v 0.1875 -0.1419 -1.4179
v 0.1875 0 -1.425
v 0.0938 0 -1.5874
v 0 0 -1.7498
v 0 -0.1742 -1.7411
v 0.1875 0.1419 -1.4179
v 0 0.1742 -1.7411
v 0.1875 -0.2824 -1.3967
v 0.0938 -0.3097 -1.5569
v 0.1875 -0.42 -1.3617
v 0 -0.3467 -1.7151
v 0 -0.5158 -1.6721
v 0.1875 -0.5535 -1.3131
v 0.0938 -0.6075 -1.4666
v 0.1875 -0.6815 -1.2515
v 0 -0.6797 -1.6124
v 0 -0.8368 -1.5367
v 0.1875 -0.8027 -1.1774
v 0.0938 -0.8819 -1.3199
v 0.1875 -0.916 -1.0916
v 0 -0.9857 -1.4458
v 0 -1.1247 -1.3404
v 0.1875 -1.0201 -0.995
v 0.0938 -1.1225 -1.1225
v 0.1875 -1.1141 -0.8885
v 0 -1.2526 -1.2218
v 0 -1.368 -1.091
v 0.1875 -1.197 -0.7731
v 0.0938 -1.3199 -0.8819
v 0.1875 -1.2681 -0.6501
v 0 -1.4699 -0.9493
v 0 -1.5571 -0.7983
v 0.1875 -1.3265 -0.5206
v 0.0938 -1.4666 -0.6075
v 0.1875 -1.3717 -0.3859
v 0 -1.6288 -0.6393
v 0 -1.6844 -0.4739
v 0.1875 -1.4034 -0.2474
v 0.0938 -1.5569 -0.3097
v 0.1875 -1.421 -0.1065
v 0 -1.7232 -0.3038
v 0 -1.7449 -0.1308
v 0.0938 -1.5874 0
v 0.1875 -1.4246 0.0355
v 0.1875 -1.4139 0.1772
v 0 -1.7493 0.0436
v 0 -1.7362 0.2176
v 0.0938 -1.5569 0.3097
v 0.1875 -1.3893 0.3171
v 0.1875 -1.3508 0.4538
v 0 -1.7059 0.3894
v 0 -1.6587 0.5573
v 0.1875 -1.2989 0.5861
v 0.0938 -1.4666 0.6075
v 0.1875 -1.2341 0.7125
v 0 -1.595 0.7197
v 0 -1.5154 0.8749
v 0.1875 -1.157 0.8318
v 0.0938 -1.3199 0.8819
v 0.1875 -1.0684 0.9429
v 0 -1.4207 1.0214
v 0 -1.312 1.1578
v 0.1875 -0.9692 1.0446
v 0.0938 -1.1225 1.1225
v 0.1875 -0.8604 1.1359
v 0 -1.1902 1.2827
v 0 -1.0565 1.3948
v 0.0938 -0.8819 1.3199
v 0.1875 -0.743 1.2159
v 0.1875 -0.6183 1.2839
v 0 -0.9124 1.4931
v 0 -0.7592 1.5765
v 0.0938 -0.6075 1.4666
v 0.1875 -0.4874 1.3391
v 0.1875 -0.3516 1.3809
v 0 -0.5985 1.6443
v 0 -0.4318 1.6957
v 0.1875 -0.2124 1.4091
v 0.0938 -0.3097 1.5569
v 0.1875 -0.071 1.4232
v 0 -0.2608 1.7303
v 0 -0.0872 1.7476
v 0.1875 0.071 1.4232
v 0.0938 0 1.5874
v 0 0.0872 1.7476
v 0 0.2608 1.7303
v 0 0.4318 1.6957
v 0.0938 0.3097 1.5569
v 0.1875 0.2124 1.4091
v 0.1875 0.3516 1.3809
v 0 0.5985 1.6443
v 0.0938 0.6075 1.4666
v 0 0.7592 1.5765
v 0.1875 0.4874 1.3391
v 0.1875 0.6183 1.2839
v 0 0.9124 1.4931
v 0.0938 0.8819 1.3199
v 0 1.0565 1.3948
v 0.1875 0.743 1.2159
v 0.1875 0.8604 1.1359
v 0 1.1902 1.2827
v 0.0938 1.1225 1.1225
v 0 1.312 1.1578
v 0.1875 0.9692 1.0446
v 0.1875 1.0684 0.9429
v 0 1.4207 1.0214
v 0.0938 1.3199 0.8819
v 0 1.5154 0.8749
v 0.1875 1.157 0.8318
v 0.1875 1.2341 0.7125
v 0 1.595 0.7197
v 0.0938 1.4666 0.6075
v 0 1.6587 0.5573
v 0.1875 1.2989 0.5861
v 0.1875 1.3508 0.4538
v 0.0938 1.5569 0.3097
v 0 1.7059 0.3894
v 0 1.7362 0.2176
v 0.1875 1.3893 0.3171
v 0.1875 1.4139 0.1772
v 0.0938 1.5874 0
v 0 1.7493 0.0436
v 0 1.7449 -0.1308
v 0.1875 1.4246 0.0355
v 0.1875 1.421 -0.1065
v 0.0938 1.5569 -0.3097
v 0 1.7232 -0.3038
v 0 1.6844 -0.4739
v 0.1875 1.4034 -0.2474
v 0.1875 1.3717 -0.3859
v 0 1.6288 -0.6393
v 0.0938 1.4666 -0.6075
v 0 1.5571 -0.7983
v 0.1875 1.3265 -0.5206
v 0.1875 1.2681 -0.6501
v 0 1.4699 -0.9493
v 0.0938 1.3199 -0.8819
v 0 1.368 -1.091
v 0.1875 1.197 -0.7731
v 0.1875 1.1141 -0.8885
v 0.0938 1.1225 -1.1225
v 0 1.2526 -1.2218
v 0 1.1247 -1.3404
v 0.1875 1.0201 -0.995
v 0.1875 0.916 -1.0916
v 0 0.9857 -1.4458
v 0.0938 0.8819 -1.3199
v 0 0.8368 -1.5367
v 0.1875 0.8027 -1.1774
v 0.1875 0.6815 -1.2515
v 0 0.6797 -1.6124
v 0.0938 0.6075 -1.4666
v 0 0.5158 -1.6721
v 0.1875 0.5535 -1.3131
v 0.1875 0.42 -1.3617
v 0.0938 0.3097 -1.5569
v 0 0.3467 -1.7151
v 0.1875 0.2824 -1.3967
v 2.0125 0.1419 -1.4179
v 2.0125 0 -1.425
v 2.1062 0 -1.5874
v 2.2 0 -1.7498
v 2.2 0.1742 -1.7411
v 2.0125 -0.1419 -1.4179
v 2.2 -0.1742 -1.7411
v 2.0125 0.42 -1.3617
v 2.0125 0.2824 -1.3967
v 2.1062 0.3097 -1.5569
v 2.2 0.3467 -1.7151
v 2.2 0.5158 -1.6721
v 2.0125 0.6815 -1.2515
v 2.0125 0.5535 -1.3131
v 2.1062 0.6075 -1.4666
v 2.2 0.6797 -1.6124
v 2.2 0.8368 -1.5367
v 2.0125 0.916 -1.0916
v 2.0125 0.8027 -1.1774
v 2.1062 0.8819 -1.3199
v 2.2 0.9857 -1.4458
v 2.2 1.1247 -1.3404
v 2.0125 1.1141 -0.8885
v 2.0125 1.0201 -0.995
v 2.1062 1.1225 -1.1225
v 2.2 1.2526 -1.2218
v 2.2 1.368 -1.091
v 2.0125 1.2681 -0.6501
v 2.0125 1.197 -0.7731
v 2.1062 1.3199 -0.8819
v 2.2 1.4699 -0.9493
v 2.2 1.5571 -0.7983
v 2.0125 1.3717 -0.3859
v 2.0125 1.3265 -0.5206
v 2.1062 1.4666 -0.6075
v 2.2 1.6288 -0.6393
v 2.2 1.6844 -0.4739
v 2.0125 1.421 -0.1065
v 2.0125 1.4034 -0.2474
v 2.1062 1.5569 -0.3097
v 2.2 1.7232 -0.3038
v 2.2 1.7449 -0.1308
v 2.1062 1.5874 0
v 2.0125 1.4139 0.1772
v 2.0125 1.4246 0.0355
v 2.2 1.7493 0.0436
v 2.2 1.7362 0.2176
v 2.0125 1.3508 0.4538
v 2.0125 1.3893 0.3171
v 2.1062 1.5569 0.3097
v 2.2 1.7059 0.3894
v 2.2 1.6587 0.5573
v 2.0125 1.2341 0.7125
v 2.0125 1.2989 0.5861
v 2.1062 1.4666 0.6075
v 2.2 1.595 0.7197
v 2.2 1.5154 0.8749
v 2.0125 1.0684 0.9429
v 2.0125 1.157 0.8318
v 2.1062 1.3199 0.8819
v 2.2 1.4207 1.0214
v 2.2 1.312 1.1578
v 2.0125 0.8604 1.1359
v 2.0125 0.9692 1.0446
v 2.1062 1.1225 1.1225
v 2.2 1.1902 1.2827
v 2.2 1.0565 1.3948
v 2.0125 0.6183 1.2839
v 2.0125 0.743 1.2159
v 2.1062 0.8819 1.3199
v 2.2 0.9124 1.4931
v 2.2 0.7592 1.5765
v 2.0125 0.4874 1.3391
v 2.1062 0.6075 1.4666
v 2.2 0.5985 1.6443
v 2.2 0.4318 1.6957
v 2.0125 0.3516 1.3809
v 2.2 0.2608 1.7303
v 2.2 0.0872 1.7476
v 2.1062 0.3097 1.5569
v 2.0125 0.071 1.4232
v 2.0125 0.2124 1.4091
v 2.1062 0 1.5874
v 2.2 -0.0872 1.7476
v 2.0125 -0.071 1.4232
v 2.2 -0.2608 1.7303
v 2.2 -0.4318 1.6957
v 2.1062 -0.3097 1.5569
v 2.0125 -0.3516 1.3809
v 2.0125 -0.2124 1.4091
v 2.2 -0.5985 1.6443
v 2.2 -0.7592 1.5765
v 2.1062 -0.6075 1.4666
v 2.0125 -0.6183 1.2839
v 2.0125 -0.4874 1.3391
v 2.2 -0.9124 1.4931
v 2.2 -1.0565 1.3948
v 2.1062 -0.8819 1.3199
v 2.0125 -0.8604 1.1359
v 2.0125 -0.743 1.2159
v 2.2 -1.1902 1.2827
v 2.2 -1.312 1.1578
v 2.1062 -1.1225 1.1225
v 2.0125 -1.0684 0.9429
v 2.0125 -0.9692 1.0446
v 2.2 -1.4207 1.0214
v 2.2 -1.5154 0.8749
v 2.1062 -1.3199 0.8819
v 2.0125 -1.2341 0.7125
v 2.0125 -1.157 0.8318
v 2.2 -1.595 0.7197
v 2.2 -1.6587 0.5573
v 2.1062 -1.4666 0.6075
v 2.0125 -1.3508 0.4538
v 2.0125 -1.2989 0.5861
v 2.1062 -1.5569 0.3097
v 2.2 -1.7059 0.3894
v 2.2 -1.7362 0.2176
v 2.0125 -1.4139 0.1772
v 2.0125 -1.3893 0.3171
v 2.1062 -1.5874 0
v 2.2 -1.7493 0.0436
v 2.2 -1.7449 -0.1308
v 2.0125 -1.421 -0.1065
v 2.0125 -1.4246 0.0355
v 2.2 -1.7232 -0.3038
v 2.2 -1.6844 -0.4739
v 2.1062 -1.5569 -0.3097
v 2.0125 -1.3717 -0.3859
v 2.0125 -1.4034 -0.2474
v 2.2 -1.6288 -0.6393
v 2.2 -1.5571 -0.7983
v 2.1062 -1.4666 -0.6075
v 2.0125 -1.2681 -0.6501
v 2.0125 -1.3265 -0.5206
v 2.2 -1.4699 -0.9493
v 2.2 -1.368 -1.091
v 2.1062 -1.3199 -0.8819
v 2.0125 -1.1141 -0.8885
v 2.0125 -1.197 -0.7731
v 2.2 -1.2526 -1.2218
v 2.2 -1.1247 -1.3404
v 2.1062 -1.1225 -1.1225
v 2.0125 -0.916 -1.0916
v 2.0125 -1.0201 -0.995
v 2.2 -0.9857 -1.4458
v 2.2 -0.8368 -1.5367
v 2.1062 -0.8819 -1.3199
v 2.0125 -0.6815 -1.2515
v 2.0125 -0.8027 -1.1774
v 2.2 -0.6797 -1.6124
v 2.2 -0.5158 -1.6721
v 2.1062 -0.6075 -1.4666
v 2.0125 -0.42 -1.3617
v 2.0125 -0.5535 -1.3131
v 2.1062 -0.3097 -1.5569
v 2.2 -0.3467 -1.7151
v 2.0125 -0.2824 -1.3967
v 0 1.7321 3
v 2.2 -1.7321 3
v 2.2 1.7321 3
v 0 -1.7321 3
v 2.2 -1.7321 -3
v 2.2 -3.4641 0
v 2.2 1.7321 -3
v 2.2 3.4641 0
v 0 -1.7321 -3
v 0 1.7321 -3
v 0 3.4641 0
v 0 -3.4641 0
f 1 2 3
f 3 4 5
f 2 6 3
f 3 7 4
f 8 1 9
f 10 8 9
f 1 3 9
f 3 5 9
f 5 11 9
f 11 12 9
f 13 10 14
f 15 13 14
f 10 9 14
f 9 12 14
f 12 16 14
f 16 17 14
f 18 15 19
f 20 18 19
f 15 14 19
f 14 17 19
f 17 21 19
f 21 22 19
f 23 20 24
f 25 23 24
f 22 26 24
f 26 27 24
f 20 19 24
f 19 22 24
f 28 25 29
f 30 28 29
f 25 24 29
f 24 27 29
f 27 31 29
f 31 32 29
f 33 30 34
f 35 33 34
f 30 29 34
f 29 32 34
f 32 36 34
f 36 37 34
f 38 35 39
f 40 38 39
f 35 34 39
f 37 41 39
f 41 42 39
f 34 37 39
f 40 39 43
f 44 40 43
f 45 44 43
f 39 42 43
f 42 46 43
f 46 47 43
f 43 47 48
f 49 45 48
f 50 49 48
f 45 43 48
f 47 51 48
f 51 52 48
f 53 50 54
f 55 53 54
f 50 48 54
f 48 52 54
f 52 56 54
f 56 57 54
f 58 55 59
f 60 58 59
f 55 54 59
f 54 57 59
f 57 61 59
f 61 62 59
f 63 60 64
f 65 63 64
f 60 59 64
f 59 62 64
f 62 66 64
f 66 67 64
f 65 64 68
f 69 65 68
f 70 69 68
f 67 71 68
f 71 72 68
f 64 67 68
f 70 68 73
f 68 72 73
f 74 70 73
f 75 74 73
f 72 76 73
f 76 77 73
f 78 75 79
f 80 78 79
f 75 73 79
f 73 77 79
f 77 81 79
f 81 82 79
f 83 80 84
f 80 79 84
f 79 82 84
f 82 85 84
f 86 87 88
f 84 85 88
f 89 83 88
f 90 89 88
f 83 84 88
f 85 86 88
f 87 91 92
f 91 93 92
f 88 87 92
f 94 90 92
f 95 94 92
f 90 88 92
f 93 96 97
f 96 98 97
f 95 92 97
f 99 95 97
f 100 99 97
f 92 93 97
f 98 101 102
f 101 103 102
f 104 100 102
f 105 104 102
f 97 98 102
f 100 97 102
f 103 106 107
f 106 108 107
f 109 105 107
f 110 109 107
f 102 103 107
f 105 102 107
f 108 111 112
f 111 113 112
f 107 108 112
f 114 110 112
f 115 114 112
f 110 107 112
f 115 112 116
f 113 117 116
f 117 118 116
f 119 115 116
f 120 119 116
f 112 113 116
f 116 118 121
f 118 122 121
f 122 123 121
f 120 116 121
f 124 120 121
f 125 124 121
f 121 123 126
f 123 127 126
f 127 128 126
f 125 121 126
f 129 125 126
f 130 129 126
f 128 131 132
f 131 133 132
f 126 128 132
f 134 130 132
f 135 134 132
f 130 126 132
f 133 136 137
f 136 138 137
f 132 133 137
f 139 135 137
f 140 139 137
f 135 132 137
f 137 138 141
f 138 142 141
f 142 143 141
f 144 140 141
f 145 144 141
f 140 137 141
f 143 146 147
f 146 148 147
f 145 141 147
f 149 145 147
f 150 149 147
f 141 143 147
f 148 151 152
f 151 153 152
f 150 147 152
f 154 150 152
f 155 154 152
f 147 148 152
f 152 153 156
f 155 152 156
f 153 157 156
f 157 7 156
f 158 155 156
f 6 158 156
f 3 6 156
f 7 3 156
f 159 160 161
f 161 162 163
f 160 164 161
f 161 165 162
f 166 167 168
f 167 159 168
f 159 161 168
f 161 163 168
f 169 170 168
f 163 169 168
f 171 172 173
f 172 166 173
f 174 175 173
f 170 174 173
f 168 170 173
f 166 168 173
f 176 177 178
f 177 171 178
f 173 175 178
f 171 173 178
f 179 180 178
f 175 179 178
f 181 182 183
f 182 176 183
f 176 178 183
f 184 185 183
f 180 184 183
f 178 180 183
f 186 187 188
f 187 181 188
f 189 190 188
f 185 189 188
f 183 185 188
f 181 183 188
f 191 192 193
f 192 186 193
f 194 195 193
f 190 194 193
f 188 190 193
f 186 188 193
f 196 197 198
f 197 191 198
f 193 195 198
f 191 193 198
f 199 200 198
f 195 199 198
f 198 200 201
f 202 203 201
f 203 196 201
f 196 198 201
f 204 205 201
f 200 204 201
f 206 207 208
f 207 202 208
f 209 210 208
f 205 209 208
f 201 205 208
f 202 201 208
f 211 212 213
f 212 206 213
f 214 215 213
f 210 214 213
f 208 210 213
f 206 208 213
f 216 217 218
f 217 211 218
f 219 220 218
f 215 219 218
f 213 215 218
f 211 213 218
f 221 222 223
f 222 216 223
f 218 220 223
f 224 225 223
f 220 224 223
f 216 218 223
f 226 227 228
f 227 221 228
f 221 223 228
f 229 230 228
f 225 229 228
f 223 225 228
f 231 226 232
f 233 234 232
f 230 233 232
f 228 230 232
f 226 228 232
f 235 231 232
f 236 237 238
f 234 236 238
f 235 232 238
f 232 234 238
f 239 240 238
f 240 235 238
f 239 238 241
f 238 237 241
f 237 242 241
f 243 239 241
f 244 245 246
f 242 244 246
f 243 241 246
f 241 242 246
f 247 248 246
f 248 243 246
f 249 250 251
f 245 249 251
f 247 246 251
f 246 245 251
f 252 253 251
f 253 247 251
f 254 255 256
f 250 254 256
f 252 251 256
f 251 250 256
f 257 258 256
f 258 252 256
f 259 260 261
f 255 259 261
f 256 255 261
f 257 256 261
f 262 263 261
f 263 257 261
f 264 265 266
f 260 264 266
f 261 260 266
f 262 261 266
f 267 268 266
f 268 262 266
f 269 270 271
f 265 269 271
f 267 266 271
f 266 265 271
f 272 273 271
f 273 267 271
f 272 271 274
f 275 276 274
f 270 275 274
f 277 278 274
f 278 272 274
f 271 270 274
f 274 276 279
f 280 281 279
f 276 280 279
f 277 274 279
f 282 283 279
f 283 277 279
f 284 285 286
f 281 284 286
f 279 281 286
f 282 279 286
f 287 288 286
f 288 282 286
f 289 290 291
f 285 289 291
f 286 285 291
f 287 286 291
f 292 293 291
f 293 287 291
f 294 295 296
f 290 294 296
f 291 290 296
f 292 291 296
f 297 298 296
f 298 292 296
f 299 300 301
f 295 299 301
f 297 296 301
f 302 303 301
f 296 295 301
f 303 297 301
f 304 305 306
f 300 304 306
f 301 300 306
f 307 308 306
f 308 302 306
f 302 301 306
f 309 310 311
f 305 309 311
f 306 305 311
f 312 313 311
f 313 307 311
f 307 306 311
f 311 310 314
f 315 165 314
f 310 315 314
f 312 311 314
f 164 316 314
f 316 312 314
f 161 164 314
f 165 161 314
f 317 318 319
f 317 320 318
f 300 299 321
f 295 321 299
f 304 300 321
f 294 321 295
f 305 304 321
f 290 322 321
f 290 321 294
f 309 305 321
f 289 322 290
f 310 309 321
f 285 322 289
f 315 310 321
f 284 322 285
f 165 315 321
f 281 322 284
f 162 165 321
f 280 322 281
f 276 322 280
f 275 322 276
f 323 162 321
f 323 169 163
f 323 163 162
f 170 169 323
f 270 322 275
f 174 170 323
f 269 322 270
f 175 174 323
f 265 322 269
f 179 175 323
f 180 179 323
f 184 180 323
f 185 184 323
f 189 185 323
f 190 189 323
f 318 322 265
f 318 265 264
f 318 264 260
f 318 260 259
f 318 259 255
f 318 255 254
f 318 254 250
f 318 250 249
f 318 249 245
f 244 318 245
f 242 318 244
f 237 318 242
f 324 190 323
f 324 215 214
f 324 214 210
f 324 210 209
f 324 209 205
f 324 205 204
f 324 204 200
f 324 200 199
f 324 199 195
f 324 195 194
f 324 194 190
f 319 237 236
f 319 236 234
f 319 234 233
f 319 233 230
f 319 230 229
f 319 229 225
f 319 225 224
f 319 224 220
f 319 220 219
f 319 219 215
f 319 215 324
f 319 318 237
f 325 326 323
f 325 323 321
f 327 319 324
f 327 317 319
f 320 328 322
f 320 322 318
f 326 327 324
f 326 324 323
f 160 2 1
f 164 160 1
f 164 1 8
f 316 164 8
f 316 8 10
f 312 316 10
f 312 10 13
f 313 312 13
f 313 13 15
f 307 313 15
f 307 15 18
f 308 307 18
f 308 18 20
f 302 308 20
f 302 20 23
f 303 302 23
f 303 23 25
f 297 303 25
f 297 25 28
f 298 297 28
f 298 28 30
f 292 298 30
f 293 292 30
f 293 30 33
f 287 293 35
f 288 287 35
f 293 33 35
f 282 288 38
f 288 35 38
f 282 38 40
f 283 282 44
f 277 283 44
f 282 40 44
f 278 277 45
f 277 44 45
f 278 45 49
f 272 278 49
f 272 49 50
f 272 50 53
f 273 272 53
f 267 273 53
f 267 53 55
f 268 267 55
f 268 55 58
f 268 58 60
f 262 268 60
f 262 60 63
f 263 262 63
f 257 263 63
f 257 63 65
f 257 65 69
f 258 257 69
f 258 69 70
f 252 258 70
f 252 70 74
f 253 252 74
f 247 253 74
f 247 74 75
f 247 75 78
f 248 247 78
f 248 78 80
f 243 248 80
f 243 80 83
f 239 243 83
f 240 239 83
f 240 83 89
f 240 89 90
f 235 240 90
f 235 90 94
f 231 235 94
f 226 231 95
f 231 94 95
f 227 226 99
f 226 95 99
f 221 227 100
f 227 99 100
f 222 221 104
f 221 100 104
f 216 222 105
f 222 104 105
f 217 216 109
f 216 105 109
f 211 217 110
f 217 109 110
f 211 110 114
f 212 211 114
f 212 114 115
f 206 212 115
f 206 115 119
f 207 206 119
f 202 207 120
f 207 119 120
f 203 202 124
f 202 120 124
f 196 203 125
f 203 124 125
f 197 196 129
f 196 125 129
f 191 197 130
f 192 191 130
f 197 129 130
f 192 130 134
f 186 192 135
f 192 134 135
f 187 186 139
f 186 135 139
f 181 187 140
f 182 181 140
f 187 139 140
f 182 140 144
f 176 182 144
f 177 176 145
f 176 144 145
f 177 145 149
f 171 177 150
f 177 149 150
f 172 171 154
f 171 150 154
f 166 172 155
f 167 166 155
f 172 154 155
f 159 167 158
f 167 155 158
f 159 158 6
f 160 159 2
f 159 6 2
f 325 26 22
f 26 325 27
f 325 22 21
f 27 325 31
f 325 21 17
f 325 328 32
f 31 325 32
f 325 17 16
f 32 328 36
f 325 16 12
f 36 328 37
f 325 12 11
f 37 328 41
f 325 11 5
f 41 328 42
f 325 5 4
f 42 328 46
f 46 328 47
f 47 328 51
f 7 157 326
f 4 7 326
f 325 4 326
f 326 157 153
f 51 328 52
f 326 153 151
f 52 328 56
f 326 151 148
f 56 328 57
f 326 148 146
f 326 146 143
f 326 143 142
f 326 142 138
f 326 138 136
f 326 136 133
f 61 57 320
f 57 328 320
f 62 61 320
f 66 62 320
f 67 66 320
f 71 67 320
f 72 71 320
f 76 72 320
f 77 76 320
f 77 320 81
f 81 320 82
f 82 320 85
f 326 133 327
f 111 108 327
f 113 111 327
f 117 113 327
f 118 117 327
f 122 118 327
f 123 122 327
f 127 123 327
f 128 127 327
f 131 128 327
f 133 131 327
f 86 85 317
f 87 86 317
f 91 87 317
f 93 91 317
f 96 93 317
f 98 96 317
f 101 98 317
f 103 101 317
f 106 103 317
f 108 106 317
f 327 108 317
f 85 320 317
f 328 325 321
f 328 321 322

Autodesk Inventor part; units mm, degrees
ref_plane "YZ Plane" through (0, 0, 0) normal (1, 0, 0) x (0, 1, 0)
ref_plane "XZ Plane" through (0, 0, 0) normal (0, 1, 0) x (-1, 0, 0)
sketch "Sketch1" plane through (0, 0, 0) normal (1, 0, 0) x (0, 1, 0)
  line L0 (1.7321, -3) -> (-1.7321, -3)
  line L1 (-1.7321, -3) -> (-3.4641, 0)
  line L2 (-3.4641, 0) -> (-1.7321, 3)
  line L3 (-1.7321, 3) -> (1.7321, 3)
  line L4 (1.7321, 3) -> (3.4641, 0)
  line L5 (3.4641, 0) -> (1.7321, -3)
  point P0 (0, 0)
  point P1 (0, 0)
  dimension "d0" = 6.9282
extrude "Body" add sketch "Sketch1" along normal blind 2.2
sketch "Sketch2" plane through (2.2, 0, 0) normal (1, 0, 0) x (0, 0, -1)
  point P0 (0, 0)
hole "Thread" at (2.2, 0, 0) direction (-1, 0, 0) diameter 2.85 end through all thread size "M3.5x0.6" class "6H" standard "ISO Metric profile"
chamfer "Chamfer2" distance 0.3248 angle 30 1 edges at (2.2, 0, 1.425) measured on face at (2.2, -2.123, -1.2698)
chamfer "Chamfer1" distance 0.3248 angle 30 1 edges at (0, 0, 1.425) measured on face at (0, -2.123, -1.2698)
ref_plane "Work Plane1" through (-7.2255, 0, 0) normal (0, 0, -1) x (1, 0, 0)
equation "\"d0\" = 1.1547 * SW"
equation "\"d1\" = KOH"
equation "\"d12\" = -0.5 * GD1 + 0.5 * NND"
equation "\"d19\" = -0.5 * GD1 + 0.5 * NND"
equation "\"d10\" = -0.5 * GD1 + 0.5 * NND"
equation "\"d18\" = -0.5 * GD1 + 0.5 * NND"
equation "\"NND\" = 3.5"
equation "\"KOH\" = 2.2"
equation "\"SW\" = 6"
equation "\"GUL\" = 0.541266 * PTC"
equation "\"THREADDIA\" = 3.5"
equation "\"TOA\" = 30deg"
equation "\"PTC\" = 0.6"
equation "\"E0\" = 1.155 * SW"
equation "\"GAL\" = 0.541266 * PTC"
equation "\"GD1\" = 2.850481"
properties part number "AS 1474 - M3.5" material "Steel, Mild"
